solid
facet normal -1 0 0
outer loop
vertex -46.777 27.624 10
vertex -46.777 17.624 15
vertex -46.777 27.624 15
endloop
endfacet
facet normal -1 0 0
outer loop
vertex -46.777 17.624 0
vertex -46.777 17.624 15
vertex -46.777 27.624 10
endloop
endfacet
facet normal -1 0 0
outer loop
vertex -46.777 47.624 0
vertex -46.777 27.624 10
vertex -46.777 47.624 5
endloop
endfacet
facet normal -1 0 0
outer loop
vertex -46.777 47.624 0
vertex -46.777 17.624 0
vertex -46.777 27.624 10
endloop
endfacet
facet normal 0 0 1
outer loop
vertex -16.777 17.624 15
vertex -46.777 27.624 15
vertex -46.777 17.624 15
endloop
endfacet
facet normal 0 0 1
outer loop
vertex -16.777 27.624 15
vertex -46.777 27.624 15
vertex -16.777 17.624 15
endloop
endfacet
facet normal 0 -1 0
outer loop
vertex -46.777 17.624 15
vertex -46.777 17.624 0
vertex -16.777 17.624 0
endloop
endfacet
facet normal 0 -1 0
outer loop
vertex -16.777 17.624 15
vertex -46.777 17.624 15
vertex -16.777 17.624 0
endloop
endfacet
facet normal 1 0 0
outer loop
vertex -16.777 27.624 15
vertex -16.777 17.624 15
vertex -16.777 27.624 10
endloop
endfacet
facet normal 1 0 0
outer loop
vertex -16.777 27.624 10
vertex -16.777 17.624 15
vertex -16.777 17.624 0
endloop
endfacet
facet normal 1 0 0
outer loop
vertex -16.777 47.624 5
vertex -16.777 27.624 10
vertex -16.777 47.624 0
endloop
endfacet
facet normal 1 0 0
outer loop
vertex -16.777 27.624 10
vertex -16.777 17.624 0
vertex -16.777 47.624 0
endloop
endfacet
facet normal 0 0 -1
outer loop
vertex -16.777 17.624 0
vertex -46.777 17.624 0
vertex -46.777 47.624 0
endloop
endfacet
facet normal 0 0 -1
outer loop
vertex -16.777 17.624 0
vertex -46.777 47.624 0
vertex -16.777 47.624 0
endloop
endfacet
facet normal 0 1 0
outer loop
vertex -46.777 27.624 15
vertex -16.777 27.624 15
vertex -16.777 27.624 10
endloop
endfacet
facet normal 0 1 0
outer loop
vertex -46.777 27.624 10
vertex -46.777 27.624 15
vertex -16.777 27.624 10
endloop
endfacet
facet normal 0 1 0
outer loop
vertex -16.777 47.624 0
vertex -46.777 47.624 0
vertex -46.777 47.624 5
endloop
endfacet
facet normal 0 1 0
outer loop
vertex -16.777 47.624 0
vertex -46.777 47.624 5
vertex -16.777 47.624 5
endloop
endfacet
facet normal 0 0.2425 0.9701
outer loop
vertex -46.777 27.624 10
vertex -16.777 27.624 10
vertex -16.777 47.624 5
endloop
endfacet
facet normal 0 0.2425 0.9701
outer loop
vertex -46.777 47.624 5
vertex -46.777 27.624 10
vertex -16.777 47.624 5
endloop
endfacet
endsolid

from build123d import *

# Parameters (mm, degrees)
F0_W     = 30
F0_H     = 30
F1_DEPTH = 15
F3_DEPTH = 30.001


with BuildPart() as f1:
    # F0 (on Top) → F1 (new body)
    with BuildSketch(Plane.XY):
        with Locations((-31.776512, 32.623932)):
            Rectangle(F0_W, F0_H)
    extrude(amount=F1_DEPTH)

    # F2 (on face) → F3 (cut, through all)
    with BuildSketch(Plane.YZ.offset(-16.776512)):
        Polygon((27.623932, 10), (47.623932, 5), (47.623932, 15), (27.623932, 15), align=None)
    extrude(amount=-F3_DEPTH, mode=Mode.SUBTRACT)


solid = f1.part
